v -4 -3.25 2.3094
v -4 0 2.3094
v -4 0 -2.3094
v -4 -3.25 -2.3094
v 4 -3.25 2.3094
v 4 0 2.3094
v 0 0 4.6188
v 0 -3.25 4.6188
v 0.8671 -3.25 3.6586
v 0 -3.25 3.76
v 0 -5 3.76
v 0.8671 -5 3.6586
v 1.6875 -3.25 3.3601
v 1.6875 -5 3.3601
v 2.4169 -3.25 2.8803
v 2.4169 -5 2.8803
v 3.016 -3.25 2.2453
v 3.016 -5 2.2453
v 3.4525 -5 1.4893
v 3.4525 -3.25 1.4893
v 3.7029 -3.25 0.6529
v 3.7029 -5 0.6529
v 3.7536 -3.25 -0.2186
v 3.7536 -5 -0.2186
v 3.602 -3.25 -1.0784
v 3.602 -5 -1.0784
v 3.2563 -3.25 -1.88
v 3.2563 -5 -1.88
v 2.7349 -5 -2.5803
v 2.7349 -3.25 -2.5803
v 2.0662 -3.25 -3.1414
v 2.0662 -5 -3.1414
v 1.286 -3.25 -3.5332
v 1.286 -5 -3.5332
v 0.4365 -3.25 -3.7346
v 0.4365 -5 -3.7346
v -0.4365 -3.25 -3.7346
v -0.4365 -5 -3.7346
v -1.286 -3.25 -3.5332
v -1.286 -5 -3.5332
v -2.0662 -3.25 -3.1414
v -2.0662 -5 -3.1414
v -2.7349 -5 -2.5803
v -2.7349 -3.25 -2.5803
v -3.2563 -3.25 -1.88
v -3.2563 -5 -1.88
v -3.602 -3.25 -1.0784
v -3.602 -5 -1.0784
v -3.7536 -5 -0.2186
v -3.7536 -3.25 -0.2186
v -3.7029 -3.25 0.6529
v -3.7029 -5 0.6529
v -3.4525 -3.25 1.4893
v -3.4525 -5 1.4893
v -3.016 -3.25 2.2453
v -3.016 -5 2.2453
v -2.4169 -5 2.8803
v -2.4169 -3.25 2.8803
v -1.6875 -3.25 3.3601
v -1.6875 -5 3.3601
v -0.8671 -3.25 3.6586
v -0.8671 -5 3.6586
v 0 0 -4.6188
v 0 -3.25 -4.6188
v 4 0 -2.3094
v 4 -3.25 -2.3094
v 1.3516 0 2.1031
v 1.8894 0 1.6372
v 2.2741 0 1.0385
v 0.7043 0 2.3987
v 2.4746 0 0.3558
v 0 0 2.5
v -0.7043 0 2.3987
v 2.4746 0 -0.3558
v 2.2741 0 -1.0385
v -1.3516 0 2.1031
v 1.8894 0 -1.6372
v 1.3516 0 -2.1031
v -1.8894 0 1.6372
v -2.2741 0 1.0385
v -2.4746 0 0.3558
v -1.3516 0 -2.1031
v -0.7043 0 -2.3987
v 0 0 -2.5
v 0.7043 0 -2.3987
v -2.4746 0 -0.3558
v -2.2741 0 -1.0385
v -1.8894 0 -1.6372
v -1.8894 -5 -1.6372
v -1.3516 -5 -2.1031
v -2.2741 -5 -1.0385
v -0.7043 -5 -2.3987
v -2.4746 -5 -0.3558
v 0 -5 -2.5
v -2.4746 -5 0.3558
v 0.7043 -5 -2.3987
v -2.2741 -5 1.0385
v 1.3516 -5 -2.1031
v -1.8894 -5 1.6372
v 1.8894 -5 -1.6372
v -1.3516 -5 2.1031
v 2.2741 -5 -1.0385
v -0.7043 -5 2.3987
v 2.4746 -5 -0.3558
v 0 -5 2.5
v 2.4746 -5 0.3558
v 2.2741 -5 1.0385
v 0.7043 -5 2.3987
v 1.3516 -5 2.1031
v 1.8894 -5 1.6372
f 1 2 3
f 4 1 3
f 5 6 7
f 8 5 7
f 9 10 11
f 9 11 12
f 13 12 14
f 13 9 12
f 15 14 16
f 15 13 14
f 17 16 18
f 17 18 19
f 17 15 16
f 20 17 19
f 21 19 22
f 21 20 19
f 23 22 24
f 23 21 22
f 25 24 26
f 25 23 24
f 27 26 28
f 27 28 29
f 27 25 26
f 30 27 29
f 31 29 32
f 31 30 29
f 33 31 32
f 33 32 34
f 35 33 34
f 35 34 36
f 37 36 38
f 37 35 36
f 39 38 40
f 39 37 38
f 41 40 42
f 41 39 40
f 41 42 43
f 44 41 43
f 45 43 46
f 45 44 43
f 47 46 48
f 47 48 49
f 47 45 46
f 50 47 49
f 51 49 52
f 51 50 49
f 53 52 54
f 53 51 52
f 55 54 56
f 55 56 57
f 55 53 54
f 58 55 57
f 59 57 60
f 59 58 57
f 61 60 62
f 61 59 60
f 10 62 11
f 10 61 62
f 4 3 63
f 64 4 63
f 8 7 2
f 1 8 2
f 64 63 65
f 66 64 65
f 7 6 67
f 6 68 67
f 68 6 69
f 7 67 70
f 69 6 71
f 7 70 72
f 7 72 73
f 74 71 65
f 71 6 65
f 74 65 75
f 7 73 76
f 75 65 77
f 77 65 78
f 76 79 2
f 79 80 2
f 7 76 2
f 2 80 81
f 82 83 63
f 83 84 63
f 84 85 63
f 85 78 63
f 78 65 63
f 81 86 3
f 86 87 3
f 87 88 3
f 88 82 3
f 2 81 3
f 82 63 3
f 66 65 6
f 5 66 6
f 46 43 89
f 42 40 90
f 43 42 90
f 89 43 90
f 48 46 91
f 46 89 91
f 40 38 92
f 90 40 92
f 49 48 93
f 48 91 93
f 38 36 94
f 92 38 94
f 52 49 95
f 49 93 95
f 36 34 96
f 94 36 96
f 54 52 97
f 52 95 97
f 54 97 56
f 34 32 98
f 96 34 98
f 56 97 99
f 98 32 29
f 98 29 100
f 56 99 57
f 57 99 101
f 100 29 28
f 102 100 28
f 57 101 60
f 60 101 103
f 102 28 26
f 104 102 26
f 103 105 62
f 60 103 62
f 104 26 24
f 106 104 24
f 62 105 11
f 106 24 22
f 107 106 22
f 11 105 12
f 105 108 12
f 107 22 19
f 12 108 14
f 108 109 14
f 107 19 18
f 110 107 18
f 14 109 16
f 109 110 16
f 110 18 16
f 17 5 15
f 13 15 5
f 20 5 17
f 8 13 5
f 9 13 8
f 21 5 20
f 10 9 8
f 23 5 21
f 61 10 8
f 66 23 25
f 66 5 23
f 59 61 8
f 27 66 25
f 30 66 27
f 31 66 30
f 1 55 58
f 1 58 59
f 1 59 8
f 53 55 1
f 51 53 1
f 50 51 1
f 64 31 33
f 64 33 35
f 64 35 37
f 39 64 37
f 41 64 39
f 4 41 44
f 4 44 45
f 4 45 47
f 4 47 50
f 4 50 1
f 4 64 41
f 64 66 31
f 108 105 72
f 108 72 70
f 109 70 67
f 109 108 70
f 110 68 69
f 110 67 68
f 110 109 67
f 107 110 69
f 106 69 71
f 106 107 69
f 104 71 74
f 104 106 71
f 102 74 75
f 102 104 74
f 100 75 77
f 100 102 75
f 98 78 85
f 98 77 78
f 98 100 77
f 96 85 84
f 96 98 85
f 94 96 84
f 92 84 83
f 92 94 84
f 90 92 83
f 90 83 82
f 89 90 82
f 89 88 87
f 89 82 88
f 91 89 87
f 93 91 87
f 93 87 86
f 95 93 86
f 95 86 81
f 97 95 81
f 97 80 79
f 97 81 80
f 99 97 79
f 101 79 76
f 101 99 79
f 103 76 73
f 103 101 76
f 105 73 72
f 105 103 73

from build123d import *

# Parameters (mm, degrees)
BOSS_EXTRUDE1_DEPTH     = 3.25
SKETCH2_R               = 3.76
BOSS_EXTRUDE2_DEPTH     = 1.75
CUT_EXTRUDE1_DEPTH      = 8.895146188
CUT_EXTRUDE1_DEPTH_BACK = 8.895146188
SKETCH3_R               = 2.5


with BuildPart() as part:
    # Sketch1 → Boss-Extrude1 (new body)
    with BuildSketch(Plane(origin=(0, 0, 0), x_dir=(1, 0, 0), z_dir=(0, 1, 0))):
        Polygon((4, -2.309401077), (0, -4.618802154), (-4, -2.309401077), (-4, 2.309401077), (0, 4.618802154), (4, 2.309401077), align=None)
    extrude(amount=-BOSS_EXTRUDE1_DEPTH)

    # Sketch2 → Boss-Extrude2 (add)
    with BuildSketch(Plane(origin=(0, -3.25, 0), x_dir=(1, 0, 0), z_dir=(0, 1, 0))):
        with Locations(Location((0, 0, 0), (0, 0, 270))):
            Circle(SKETCH2_R)
    extrude(amount=-BOSS_EXTRUDE2_DEPTH)

    # Sketch3 → Cut-Extrude1 (cut, two sides: drawn at the far end of the back side and taken through both)
    with BuildSketch(Plane(origin=(0, 0, 0), x_dir=(1, 0, 0), z_dir=(0, 1, 0)).offset(-CUT_EXTRUDE1_DEPTH_BACK)):
        with Locations(Location((0, 0, 0), (0, 0, 270))):
            Circle(SKETCH3_R)
    extrude(amount=CUT_EXTRUDE1_DEPTH + CUT_EXTRUDE1_DEPTH_BACK, mode=Mode.SUBTRACT)


solid = part.part
